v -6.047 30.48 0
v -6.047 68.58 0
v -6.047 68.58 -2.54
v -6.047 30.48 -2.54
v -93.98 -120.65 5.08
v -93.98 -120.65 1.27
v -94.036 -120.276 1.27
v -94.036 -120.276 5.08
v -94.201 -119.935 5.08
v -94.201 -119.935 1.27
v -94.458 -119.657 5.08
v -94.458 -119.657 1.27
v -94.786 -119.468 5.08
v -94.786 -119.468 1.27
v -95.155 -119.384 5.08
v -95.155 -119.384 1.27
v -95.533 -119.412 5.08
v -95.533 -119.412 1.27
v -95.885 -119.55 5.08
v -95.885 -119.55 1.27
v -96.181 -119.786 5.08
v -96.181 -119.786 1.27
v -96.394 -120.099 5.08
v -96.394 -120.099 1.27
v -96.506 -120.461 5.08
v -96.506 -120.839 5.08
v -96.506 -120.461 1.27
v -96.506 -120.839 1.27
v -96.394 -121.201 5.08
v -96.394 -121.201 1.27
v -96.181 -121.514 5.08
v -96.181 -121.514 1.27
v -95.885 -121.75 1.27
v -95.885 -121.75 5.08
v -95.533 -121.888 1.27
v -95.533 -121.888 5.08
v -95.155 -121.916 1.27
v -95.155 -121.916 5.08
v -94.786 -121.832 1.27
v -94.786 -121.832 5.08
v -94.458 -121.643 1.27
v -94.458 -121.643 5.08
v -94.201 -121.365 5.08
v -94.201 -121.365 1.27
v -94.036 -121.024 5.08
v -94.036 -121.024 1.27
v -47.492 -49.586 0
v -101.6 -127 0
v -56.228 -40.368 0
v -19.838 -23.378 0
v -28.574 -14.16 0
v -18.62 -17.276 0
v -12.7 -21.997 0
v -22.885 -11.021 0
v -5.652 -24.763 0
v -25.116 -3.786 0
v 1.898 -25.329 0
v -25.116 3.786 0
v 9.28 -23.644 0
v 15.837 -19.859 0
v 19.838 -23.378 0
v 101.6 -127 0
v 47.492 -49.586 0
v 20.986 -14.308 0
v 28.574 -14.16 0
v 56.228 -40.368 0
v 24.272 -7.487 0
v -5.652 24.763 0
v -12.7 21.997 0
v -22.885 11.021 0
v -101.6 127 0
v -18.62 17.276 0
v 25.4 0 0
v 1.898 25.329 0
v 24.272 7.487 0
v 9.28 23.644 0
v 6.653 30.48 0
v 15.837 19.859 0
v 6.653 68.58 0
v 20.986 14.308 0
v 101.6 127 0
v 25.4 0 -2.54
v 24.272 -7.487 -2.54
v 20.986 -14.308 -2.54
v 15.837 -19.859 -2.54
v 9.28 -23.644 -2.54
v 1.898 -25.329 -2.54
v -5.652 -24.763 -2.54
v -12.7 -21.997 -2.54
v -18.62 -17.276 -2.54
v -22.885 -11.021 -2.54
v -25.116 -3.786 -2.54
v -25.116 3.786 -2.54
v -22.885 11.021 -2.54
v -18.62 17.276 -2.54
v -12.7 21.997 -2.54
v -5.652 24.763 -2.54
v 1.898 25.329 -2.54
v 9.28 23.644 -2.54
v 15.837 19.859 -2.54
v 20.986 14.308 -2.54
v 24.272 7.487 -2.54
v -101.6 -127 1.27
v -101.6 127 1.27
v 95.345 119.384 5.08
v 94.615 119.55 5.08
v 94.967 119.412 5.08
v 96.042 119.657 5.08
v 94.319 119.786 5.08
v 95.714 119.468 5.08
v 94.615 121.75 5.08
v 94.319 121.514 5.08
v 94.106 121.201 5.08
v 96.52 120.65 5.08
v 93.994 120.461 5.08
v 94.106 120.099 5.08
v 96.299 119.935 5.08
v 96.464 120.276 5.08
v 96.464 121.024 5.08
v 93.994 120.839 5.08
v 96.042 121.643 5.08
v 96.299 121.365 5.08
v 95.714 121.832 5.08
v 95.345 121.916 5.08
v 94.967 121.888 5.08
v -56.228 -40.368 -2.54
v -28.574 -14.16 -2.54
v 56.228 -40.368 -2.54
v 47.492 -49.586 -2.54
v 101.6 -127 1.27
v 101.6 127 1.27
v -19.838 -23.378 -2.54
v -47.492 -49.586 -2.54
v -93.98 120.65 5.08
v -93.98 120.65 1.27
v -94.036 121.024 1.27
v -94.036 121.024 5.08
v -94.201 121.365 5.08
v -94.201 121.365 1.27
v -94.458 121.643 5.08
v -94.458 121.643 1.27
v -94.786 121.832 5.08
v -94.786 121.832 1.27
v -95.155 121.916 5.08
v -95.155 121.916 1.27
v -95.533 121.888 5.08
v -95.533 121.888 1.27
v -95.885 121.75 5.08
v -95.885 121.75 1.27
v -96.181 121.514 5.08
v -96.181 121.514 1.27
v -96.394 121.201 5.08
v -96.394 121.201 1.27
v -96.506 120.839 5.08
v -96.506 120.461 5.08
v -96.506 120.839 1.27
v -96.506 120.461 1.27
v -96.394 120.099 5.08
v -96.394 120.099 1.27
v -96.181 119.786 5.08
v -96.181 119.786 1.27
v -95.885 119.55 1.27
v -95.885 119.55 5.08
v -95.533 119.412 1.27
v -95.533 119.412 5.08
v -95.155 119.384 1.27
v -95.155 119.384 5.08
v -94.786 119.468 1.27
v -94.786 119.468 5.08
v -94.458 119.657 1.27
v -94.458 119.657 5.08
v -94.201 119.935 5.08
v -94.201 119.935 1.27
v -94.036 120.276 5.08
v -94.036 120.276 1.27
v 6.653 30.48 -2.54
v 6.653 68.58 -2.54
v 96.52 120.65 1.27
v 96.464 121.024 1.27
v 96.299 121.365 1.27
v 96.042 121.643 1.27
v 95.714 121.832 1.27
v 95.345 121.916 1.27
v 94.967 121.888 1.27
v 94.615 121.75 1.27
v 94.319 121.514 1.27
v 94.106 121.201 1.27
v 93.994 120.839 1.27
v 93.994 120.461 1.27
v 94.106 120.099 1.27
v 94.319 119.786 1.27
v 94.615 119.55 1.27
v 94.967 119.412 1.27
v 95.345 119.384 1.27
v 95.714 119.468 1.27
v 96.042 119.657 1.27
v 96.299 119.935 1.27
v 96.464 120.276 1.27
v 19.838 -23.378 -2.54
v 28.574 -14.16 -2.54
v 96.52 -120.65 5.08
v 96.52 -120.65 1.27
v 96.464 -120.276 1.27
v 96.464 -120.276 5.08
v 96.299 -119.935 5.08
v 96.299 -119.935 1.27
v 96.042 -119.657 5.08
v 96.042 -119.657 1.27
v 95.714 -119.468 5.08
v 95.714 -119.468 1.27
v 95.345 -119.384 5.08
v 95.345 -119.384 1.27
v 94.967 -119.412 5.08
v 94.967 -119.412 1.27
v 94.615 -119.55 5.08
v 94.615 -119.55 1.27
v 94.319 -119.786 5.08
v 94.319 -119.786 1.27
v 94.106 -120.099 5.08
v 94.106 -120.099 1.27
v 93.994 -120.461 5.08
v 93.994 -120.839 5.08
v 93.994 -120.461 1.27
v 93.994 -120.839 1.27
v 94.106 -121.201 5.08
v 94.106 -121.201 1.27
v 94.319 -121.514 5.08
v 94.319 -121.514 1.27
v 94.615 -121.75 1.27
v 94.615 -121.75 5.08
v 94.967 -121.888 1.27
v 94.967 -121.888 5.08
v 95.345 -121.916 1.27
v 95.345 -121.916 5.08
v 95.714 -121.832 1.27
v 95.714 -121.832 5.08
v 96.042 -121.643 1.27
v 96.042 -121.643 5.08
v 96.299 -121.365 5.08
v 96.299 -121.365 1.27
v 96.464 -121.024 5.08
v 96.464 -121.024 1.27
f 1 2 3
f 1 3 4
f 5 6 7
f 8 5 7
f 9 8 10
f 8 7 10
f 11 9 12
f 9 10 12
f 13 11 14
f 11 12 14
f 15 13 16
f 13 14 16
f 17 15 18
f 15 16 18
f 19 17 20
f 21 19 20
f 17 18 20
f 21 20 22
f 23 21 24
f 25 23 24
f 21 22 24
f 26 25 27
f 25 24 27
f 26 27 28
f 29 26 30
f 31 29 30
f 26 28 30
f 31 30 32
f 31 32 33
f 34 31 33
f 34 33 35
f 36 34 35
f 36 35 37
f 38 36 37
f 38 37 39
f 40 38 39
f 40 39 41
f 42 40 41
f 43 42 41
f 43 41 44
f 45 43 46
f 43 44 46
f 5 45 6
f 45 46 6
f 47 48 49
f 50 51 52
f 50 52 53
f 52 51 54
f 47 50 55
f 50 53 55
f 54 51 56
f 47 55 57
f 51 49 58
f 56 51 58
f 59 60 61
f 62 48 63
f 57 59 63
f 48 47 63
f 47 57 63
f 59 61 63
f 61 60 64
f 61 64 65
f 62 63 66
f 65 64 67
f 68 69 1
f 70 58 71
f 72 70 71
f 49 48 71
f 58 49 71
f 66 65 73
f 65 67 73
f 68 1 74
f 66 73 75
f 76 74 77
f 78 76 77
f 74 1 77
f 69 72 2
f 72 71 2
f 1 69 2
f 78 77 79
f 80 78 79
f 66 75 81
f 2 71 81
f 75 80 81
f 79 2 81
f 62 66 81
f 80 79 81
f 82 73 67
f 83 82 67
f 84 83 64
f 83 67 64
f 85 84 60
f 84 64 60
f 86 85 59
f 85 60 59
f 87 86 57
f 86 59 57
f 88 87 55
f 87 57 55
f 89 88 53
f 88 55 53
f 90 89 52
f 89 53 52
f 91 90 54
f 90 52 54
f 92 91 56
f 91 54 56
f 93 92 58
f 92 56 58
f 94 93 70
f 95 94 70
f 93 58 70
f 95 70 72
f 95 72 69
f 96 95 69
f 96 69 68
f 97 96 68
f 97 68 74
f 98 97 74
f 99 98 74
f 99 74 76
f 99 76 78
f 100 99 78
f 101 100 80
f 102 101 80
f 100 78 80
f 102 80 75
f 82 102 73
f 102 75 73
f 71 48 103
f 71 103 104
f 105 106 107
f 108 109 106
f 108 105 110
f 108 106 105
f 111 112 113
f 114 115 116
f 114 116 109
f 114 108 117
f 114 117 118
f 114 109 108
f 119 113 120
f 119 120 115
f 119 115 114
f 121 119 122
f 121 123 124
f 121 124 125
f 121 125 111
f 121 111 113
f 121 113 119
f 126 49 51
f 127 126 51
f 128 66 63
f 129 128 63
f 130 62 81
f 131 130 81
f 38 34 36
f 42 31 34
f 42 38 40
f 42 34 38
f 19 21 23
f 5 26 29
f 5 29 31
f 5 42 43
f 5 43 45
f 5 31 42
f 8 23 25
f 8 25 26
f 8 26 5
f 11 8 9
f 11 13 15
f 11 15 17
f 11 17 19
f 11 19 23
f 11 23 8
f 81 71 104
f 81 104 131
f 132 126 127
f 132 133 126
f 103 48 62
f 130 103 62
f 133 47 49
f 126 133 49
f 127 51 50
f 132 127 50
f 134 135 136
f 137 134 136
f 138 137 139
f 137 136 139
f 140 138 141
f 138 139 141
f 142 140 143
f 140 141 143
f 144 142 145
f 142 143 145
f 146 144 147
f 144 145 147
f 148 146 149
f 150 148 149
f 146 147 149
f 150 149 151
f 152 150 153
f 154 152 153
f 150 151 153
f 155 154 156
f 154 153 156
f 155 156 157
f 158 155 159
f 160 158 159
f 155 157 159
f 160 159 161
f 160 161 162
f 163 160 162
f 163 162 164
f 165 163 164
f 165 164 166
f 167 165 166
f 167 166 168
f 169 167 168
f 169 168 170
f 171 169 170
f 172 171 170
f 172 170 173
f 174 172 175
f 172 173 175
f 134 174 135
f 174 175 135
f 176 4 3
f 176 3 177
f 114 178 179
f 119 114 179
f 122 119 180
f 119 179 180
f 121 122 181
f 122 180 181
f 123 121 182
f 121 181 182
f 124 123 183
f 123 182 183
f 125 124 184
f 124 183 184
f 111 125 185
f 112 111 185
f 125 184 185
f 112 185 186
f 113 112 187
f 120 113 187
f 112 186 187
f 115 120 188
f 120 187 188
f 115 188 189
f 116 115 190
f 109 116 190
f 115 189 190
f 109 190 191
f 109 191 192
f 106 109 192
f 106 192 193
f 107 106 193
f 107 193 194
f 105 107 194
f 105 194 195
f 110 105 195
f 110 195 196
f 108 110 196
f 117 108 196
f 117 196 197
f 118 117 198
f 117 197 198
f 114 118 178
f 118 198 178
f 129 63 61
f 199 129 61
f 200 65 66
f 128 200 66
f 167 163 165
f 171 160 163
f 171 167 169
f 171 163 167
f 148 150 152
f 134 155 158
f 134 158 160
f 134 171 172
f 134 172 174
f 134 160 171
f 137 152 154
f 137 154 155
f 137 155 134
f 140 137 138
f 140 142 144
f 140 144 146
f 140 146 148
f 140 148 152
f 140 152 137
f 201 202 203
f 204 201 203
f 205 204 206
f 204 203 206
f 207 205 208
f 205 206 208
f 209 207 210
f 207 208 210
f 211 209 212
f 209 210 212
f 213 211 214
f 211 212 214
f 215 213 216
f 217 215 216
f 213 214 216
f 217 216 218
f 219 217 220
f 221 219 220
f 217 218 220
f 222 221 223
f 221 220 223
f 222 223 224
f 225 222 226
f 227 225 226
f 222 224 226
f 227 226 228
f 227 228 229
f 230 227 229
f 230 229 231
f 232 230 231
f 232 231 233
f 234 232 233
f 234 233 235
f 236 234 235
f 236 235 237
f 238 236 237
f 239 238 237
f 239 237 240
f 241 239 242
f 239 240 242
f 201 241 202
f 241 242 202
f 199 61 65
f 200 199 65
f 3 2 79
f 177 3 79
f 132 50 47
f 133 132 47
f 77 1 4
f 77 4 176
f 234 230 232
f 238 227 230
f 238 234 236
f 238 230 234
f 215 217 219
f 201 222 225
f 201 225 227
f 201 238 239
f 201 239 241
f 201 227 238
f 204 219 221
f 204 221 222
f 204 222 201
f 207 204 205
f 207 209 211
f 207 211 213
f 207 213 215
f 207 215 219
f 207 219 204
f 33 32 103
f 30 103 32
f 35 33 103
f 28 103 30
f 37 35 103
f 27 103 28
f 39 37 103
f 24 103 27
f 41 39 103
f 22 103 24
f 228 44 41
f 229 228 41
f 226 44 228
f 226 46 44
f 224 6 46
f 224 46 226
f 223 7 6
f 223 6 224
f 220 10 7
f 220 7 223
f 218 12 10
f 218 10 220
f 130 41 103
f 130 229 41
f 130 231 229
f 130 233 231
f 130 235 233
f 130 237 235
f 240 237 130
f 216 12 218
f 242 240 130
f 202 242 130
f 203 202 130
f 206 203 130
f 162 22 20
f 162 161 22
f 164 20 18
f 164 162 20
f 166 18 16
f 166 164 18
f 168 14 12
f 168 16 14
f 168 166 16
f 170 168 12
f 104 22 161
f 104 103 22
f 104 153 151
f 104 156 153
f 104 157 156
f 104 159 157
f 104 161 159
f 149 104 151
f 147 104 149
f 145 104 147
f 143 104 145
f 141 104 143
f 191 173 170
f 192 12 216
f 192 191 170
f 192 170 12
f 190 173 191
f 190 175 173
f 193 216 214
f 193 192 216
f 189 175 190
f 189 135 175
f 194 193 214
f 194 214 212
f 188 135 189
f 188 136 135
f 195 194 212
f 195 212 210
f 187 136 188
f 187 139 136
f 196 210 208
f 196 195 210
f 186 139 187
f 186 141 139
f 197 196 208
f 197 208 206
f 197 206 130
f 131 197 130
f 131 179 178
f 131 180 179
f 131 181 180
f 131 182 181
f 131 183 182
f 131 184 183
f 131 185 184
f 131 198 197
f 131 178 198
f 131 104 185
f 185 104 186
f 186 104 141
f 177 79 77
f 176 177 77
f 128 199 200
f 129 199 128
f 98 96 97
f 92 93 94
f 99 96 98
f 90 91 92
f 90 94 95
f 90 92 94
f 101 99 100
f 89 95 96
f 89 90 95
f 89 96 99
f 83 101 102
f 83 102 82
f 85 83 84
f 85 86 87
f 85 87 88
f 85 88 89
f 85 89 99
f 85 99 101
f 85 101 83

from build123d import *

# Parameters (mm, degrees)
F0_W     = 203.2
F0_H     = 254
F1_DEPTH = 1.27
F2_R     = 1.27
F3_DEPTH = 3.81
F4_R     = 25.4
F4_W     = 12.7
F4_H     = 38.1
F5_DEPTH = 2.54


with BuildPart() as f1:
    # F0 (on Top) → F1 (new body)
    with BuildSketch(Plane.XY):
        Rectangle(F0_W, F0_H)
    extrude(amount=F1_DEPTH)

    # F2 (on face) → F3 (join)
    with BuildSketch(Plane.XY.offset(1.27)):
        with Locations((-95.25, 120.65)):
            Circle(F2_R)
        with Locations((95.25, 120.65)):
            Circle(F2_R)
        with Locations((95.25, -120.65)):
            Circle(F2_R)
        with Locations((-95.25, -120.65)):
            Circle(F2_R)
    extrude(amount=F3_DEPTH)

    # F4 (on face) → F5 (join)
    with BuildSketch(Plane(origin=(0, 0, 0), x_dir=(1, 0, 0), z_dir=(0, 0, -1))):
        Polygon((-56.228016, 40.367917), (-28.573968, 14.159834), (-19.83794, 23.377851), (-47.491989, 49.585933), align=None)
        Circle(F4_R)
        Polygon((56.228016, 40.367917), (47.491989, 49.585933), (19.83794, 23.377851), (28.573968, 14.159834), align=None)
        with Locations((0.303105, -49.53)):
            Rectangle(F4_W, F4_H)
    extrude(amount=F5_DEPTH)


solid = f1.part
